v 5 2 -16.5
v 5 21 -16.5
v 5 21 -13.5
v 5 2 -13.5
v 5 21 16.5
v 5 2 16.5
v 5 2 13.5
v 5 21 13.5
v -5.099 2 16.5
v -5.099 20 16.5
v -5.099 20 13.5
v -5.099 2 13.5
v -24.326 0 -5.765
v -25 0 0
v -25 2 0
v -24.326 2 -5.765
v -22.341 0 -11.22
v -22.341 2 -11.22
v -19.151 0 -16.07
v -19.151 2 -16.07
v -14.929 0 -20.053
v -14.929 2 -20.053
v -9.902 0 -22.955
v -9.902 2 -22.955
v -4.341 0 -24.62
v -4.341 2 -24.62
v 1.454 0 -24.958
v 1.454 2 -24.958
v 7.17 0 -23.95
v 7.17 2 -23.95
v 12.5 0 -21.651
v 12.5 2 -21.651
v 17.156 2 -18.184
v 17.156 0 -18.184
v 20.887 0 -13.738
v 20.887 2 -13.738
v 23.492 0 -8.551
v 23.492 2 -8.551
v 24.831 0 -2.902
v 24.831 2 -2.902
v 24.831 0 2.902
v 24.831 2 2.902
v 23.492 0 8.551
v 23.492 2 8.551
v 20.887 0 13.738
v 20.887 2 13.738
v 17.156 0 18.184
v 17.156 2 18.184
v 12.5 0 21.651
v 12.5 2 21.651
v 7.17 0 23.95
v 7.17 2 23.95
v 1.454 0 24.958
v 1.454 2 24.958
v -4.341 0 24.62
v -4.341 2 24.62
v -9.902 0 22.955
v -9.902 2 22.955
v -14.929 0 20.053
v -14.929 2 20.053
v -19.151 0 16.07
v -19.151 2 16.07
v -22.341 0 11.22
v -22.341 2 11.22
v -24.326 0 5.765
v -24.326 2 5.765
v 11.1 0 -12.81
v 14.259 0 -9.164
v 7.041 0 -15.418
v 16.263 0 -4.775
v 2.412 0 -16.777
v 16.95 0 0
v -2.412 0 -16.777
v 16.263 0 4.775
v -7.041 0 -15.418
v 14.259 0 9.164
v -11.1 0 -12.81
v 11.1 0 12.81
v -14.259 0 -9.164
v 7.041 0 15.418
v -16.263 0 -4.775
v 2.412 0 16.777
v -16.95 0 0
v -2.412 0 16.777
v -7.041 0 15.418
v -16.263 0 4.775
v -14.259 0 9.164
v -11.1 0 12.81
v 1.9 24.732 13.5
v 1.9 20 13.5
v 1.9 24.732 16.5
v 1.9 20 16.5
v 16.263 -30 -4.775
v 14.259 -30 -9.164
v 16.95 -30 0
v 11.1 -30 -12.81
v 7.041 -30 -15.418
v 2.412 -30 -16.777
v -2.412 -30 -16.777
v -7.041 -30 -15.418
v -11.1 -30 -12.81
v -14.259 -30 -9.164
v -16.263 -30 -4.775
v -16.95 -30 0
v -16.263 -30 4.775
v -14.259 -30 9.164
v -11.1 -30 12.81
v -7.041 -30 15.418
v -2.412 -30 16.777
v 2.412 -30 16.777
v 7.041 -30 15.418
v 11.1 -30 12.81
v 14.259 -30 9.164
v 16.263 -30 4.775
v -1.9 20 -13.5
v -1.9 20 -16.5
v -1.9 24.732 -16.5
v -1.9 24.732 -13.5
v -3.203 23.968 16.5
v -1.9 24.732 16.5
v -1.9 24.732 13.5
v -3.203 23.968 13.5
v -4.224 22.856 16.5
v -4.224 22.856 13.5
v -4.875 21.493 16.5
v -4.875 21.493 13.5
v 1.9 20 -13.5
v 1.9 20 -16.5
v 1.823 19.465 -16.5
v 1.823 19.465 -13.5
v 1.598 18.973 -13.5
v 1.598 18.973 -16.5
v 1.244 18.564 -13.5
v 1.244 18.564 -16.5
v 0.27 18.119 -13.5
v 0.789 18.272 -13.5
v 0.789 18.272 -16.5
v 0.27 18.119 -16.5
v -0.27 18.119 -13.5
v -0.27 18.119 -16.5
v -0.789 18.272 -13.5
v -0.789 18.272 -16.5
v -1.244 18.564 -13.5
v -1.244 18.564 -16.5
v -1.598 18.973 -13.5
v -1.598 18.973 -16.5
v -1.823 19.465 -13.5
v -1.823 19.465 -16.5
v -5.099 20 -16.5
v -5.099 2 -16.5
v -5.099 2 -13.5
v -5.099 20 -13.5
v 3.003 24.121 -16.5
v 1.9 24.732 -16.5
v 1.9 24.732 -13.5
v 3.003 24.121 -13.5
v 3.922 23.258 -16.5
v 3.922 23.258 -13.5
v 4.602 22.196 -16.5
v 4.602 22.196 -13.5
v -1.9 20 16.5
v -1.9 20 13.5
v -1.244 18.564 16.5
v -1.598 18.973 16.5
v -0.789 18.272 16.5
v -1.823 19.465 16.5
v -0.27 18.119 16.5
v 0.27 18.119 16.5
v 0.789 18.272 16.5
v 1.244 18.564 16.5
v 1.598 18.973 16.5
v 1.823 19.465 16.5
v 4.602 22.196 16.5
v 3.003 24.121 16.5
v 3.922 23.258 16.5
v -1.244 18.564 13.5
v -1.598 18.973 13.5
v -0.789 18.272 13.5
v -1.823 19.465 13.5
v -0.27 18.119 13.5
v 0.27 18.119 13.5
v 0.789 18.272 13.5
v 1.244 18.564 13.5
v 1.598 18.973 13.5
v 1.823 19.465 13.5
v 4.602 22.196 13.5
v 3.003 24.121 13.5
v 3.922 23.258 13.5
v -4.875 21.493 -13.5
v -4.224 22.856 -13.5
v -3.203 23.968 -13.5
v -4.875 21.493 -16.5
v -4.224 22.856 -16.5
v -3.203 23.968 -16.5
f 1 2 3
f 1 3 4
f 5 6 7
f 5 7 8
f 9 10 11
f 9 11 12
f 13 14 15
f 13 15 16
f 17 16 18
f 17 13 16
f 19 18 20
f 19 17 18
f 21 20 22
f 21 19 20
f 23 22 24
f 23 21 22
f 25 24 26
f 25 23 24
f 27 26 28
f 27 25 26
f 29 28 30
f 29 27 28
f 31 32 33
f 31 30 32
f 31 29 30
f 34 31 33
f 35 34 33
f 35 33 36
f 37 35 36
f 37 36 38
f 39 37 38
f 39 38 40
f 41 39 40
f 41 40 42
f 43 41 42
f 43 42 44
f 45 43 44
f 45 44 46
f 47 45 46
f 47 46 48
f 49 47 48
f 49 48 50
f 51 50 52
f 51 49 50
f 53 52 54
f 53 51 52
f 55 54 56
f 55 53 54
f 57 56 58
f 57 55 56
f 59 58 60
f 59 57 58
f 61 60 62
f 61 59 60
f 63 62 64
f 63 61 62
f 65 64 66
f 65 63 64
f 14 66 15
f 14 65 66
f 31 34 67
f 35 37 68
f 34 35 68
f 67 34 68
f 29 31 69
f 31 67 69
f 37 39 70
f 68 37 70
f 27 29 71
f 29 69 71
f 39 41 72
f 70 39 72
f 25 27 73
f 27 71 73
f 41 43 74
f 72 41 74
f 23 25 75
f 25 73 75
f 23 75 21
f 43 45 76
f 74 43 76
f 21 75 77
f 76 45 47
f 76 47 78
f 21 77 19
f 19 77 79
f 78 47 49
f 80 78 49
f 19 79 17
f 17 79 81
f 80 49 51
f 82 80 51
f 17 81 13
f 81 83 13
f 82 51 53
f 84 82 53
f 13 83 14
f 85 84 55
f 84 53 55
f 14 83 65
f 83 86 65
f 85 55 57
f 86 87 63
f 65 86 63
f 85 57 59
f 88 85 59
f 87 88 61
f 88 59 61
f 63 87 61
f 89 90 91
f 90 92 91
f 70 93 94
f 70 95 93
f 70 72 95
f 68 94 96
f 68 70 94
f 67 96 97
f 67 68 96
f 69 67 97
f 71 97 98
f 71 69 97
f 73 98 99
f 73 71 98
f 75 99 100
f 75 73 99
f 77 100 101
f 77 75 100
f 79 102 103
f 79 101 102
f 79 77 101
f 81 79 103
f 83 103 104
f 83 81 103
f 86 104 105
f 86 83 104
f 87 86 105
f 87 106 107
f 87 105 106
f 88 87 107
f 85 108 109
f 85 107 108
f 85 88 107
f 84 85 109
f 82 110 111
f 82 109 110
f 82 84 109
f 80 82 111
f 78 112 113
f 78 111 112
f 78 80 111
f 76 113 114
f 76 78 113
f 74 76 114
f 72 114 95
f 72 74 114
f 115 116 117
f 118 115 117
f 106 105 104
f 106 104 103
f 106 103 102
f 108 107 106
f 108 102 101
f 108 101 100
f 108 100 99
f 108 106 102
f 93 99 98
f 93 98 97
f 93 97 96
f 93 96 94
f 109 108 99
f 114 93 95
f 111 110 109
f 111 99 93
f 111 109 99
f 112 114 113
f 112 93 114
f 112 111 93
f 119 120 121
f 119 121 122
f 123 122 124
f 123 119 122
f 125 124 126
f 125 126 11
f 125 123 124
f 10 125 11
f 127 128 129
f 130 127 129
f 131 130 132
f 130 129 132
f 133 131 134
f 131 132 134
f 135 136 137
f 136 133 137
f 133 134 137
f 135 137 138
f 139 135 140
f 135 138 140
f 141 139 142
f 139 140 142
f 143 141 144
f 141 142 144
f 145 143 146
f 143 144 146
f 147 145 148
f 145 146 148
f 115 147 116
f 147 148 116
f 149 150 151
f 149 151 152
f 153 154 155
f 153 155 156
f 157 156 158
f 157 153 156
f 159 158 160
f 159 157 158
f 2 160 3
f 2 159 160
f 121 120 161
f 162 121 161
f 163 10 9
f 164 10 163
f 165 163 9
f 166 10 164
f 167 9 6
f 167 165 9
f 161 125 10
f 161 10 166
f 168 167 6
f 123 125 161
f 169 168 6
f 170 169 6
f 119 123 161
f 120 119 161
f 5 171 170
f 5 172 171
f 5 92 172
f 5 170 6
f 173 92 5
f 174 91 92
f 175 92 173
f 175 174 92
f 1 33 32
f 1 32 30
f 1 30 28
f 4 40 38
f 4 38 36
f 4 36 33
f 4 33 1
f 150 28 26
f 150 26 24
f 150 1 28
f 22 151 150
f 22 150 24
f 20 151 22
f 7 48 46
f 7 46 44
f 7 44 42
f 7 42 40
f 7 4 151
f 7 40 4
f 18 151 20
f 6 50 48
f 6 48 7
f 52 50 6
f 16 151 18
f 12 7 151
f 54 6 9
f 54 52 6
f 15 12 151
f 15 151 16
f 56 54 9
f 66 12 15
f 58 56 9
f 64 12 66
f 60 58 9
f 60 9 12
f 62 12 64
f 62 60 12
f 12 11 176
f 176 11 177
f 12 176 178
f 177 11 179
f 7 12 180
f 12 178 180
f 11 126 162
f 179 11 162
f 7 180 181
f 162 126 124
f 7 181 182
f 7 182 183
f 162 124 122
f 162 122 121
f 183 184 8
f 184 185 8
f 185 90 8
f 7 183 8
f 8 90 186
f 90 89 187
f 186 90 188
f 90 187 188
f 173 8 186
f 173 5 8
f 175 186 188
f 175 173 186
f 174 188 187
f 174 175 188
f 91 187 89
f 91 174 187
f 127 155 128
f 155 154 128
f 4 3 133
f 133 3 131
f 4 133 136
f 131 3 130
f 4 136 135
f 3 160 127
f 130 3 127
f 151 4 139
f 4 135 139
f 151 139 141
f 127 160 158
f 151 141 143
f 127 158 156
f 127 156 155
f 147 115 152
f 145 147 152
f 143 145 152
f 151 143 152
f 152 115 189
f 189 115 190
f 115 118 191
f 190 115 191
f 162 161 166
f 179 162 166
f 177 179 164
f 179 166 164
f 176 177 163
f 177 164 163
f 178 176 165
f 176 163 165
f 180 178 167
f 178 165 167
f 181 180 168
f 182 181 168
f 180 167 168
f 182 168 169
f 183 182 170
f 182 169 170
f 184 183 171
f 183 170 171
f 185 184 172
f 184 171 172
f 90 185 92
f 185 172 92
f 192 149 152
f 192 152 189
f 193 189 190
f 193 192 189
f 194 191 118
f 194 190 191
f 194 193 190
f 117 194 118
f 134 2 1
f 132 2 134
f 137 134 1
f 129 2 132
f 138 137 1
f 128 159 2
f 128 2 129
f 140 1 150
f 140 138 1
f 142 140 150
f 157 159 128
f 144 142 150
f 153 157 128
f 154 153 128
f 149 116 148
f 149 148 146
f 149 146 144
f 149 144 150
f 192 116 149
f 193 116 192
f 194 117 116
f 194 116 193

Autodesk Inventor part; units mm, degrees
ref_plane "YZ Plane" through (0, 0, 0) normal (1, 0, 0) x (0, 1, 0)
ref_plane "XZ Plane" through (0, 0, 0) normal (0, 1, 0) x (-1, 0, 0)
sketch "Sketch1" plane through (0, 0, 0) normal (0, 1, 0) x (-1, 0, 0)
  circle A0 centre (0, 0) radius 25
  dimension "d12" = 50
extrude "Extrusion1" add sketch "Sketch1" along normal blind 2
mirror "Mirror1" about plane through (0, 0, 0) normal (0, 0, 1)
ref_plane "Work Plane2" through (0, 0, 16.5) normal (0, 0, 1) x (1, 0, 0)
sketch "Sketch9" plane through (0, 0, 16.5) normal (0, 0, 1) x (1, 0, 0)
  line L0 (-5.099, 2) -> (5, 2)
  line L1 (5, 2) -> (5, 21)
  line L2 (-5.099, 20) -> (-5.099, 2)
  line L3 (0, -1.6) -> (0, 30.6) construction
  arc A0 (5, 21) -> (-5.099, 20) centre (0, 20) ccw
  circle A1 centre (0, 20) radius 1.9
  line L4 (25, 2) -> (-25, 2) projected
  dimension "d19" = 5
  dimension "d20" = 3.8
  dimension "d65" = 0
  dimension "d66" = 18
extrude "Extrusion3" add sketch "Sketch9" against normal blind 3
sketch "Sketch20" plane through (0, 0, 16.5) normal (0, 0, 1) x (1, 0, 0)
  circle A0 centre (0, 20) radius 1.9 projected
  line L0 (-1.9, 20) -> (1.9, 20)
  line L1 (1.9, 20) -> (1.9, 25.4725)
  line L2 (1.9, 25.4725) -> (-1.9, 25.4725)
  line L3 (-1.9, 25.4725) -> (-1.9, 20)
  point P0 (0, 0)
extrude "Extrusion14" cut sketch "Sketch20" against normal blind 3 contours A0 L3 L2 L1
mirror "Mirror5" about plane through (0, 0, 0) normal (0, 0, 1) of "Extrusion3", "Extrusion14"
sketch "Sketch21" plane through (0, 0, 0) normal (0, -1, 0) x (1, 0, 0)
  circle A0 centre (0, 0) radius 16.95
  dimension "d62" = 33.9
extrude "Extrusion15" add sketch "Sketch21" along normal blind 30
ref_plane "Work Plane1" through (0, 0, 0) normal (0, 0, 1) x (1, 0, 0)
properties part number "BaseComple"
